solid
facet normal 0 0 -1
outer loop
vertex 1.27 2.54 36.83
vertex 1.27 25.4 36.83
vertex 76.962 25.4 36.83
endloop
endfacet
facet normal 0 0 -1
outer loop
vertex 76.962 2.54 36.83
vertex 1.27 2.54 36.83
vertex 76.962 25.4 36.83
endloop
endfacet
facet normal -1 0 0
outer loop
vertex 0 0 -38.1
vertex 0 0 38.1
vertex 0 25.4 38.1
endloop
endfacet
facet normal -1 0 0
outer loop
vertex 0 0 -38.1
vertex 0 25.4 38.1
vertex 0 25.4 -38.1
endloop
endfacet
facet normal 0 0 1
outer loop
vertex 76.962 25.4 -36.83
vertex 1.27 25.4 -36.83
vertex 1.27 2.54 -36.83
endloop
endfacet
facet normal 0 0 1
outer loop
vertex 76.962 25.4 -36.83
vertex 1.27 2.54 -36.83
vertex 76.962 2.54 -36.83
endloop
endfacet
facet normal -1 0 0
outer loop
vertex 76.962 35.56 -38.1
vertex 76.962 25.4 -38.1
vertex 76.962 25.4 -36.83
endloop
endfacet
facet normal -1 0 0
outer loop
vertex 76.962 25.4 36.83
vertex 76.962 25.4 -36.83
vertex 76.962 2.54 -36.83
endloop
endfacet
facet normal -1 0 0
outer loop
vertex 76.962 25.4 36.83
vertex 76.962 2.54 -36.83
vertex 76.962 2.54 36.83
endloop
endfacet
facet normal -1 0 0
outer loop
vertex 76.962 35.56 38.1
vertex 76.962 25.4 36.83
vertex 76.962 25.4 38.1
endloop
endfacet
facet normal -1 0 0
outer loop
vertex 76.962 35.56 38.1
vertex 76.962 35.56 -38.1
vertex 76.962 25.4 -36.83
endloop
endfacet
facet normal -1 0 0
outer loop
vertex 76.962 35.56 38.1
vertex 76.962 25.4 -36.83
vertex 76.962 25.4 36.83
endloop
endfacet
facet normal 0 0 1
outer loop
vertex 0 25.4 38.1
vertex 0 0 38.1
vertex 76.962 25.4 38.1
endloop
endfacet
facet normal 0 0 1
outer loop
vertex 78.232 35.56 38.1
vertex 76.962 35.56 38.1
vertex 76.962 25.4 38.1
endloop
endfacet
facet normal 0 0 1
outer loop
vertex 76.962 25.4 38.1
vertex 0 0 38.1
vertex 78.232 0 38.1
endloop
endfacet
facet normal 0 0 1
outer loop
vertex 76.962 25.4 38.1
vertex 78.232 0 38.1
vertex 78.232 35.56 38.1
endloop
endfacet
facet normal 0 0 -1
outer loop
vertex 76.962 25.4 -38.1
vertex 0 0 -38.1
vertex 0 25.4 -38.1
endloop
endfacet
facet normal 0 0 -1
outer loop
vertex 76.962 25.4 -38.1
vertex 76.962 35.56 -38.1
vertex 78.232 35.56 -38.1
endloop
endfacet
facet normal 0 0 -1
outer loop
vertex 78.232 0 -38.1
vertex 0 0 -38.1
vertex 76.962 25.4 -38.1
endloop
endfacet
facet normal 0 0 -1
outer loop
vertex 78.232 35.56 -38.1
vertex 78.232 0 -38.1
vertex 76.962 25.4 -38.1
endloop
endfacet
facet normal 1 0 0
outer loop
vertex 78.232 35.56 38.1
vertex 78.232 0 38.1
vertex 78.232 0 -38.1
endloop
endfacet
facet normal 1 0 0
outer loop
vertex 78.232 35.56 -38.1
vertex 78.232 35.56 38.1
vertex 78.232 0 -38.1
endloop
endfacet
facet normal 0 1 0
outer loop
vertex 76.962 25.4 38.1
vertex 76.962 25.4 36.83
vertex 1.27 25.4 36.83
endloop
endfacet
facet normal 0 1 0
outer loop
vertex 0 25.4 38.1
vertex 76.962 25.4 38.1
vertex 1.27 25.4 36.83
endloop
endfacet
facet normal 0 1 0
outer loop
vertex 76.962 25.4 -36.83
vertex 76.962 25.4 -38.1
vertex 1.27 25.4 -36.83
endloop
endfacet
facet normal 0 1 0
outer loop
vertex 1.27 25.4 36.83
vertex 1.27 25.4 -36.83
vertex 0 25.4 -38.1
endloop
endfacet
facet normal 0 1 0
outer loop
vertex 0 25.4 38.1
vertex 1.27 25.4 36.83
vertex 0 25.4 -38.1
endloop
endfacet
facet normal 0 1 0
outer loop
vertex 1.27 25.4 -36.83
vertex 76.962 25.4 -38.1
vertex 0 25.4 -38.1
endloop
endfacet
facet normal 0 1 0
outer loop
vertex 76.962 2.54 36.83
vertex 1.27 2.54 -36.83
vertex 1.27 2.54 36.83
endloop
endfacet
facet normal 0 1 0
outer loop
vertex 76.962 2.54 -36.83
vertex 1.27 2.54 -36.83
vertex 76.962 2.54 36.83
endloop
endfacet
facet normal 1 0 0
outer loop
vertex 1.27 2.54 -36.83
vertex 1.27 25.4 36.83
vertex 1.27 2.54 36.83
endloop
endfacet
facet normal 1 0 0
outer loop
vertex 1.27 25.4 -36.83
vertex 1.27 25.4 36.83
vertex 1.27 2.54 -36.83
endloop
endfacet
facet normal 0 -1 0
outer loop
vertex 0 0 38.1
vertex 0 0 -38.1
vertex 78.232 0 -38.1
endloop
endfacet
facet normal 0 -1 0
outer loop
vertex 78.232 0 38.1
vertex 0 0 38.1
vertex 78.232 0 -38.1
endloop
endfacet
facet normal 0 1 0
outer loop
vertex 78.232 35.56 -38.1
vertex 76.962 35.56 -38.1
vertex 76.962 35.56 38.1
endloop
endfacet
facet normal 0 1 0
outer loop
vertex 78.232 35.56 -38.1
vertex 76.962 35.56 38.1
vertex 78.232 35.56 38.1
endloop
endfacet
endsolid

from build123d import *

# Parameters (mm, degrees)
SKETCH1_W           = 78.232
SKETCH1_H           = 76.2
BOSS_EXTRUDE1_DEPTH = 35.56
SKETCH2_W           = 75.692
SKETCH2_H           = 73.66
CUT_EXTRUDE1_DEPTH  = 33.02
CUT_EXTRUDE3_DEPTH  = 10.16


with BuildPart() as part:
    # Sketch1 → Boss-Extrude1 (new body)
    with BuildSketch(Plane(origin=(0, 0, 0), x_dir=(1, 0, 0), z_dir=(0, 1, 0))):
        with Locations((39.116, 0)):
            Rectangle(SKETCH1_W, SKETCH1_H)
    extrude(amount=BOSS_EXTRUDE1_DEPTH)

    # Sketch2 → Cut-Extrude1 (cut)
    with BuildSketch(Plane(origin=(0, 35.56, 0), x_dir=(1, 0, 0), z_dir=(0, 1, 0))):
        with Locations((39.116, 0)):
            Rectangle(SKETCH2_W, SKETCH2_H)
    extrude(amount=-CUT_EXTRUDE1_DEPTH, mode=Mode.SUBTRACT)

    # Sketch11 → Cut-Extrude3 (cut)
    with BuildSketch(Plane(origin=(0, 35.56, 0), x_dir=(1, 0, 0), z_dir=(0, 1, 0))):
        Polygon((76.962, -36.83), (76.962, -38.1), (0, -38.1), (0, 38.1), (76.962, 38.1), (76.962, 36.83), (1.27, 36.83), (1.27, -36.83), align=None)
    extrude(amount=-CUT_EXTRUDE3_DEPTH, mode=Mode.SUBTRACT)


solid = part.part
